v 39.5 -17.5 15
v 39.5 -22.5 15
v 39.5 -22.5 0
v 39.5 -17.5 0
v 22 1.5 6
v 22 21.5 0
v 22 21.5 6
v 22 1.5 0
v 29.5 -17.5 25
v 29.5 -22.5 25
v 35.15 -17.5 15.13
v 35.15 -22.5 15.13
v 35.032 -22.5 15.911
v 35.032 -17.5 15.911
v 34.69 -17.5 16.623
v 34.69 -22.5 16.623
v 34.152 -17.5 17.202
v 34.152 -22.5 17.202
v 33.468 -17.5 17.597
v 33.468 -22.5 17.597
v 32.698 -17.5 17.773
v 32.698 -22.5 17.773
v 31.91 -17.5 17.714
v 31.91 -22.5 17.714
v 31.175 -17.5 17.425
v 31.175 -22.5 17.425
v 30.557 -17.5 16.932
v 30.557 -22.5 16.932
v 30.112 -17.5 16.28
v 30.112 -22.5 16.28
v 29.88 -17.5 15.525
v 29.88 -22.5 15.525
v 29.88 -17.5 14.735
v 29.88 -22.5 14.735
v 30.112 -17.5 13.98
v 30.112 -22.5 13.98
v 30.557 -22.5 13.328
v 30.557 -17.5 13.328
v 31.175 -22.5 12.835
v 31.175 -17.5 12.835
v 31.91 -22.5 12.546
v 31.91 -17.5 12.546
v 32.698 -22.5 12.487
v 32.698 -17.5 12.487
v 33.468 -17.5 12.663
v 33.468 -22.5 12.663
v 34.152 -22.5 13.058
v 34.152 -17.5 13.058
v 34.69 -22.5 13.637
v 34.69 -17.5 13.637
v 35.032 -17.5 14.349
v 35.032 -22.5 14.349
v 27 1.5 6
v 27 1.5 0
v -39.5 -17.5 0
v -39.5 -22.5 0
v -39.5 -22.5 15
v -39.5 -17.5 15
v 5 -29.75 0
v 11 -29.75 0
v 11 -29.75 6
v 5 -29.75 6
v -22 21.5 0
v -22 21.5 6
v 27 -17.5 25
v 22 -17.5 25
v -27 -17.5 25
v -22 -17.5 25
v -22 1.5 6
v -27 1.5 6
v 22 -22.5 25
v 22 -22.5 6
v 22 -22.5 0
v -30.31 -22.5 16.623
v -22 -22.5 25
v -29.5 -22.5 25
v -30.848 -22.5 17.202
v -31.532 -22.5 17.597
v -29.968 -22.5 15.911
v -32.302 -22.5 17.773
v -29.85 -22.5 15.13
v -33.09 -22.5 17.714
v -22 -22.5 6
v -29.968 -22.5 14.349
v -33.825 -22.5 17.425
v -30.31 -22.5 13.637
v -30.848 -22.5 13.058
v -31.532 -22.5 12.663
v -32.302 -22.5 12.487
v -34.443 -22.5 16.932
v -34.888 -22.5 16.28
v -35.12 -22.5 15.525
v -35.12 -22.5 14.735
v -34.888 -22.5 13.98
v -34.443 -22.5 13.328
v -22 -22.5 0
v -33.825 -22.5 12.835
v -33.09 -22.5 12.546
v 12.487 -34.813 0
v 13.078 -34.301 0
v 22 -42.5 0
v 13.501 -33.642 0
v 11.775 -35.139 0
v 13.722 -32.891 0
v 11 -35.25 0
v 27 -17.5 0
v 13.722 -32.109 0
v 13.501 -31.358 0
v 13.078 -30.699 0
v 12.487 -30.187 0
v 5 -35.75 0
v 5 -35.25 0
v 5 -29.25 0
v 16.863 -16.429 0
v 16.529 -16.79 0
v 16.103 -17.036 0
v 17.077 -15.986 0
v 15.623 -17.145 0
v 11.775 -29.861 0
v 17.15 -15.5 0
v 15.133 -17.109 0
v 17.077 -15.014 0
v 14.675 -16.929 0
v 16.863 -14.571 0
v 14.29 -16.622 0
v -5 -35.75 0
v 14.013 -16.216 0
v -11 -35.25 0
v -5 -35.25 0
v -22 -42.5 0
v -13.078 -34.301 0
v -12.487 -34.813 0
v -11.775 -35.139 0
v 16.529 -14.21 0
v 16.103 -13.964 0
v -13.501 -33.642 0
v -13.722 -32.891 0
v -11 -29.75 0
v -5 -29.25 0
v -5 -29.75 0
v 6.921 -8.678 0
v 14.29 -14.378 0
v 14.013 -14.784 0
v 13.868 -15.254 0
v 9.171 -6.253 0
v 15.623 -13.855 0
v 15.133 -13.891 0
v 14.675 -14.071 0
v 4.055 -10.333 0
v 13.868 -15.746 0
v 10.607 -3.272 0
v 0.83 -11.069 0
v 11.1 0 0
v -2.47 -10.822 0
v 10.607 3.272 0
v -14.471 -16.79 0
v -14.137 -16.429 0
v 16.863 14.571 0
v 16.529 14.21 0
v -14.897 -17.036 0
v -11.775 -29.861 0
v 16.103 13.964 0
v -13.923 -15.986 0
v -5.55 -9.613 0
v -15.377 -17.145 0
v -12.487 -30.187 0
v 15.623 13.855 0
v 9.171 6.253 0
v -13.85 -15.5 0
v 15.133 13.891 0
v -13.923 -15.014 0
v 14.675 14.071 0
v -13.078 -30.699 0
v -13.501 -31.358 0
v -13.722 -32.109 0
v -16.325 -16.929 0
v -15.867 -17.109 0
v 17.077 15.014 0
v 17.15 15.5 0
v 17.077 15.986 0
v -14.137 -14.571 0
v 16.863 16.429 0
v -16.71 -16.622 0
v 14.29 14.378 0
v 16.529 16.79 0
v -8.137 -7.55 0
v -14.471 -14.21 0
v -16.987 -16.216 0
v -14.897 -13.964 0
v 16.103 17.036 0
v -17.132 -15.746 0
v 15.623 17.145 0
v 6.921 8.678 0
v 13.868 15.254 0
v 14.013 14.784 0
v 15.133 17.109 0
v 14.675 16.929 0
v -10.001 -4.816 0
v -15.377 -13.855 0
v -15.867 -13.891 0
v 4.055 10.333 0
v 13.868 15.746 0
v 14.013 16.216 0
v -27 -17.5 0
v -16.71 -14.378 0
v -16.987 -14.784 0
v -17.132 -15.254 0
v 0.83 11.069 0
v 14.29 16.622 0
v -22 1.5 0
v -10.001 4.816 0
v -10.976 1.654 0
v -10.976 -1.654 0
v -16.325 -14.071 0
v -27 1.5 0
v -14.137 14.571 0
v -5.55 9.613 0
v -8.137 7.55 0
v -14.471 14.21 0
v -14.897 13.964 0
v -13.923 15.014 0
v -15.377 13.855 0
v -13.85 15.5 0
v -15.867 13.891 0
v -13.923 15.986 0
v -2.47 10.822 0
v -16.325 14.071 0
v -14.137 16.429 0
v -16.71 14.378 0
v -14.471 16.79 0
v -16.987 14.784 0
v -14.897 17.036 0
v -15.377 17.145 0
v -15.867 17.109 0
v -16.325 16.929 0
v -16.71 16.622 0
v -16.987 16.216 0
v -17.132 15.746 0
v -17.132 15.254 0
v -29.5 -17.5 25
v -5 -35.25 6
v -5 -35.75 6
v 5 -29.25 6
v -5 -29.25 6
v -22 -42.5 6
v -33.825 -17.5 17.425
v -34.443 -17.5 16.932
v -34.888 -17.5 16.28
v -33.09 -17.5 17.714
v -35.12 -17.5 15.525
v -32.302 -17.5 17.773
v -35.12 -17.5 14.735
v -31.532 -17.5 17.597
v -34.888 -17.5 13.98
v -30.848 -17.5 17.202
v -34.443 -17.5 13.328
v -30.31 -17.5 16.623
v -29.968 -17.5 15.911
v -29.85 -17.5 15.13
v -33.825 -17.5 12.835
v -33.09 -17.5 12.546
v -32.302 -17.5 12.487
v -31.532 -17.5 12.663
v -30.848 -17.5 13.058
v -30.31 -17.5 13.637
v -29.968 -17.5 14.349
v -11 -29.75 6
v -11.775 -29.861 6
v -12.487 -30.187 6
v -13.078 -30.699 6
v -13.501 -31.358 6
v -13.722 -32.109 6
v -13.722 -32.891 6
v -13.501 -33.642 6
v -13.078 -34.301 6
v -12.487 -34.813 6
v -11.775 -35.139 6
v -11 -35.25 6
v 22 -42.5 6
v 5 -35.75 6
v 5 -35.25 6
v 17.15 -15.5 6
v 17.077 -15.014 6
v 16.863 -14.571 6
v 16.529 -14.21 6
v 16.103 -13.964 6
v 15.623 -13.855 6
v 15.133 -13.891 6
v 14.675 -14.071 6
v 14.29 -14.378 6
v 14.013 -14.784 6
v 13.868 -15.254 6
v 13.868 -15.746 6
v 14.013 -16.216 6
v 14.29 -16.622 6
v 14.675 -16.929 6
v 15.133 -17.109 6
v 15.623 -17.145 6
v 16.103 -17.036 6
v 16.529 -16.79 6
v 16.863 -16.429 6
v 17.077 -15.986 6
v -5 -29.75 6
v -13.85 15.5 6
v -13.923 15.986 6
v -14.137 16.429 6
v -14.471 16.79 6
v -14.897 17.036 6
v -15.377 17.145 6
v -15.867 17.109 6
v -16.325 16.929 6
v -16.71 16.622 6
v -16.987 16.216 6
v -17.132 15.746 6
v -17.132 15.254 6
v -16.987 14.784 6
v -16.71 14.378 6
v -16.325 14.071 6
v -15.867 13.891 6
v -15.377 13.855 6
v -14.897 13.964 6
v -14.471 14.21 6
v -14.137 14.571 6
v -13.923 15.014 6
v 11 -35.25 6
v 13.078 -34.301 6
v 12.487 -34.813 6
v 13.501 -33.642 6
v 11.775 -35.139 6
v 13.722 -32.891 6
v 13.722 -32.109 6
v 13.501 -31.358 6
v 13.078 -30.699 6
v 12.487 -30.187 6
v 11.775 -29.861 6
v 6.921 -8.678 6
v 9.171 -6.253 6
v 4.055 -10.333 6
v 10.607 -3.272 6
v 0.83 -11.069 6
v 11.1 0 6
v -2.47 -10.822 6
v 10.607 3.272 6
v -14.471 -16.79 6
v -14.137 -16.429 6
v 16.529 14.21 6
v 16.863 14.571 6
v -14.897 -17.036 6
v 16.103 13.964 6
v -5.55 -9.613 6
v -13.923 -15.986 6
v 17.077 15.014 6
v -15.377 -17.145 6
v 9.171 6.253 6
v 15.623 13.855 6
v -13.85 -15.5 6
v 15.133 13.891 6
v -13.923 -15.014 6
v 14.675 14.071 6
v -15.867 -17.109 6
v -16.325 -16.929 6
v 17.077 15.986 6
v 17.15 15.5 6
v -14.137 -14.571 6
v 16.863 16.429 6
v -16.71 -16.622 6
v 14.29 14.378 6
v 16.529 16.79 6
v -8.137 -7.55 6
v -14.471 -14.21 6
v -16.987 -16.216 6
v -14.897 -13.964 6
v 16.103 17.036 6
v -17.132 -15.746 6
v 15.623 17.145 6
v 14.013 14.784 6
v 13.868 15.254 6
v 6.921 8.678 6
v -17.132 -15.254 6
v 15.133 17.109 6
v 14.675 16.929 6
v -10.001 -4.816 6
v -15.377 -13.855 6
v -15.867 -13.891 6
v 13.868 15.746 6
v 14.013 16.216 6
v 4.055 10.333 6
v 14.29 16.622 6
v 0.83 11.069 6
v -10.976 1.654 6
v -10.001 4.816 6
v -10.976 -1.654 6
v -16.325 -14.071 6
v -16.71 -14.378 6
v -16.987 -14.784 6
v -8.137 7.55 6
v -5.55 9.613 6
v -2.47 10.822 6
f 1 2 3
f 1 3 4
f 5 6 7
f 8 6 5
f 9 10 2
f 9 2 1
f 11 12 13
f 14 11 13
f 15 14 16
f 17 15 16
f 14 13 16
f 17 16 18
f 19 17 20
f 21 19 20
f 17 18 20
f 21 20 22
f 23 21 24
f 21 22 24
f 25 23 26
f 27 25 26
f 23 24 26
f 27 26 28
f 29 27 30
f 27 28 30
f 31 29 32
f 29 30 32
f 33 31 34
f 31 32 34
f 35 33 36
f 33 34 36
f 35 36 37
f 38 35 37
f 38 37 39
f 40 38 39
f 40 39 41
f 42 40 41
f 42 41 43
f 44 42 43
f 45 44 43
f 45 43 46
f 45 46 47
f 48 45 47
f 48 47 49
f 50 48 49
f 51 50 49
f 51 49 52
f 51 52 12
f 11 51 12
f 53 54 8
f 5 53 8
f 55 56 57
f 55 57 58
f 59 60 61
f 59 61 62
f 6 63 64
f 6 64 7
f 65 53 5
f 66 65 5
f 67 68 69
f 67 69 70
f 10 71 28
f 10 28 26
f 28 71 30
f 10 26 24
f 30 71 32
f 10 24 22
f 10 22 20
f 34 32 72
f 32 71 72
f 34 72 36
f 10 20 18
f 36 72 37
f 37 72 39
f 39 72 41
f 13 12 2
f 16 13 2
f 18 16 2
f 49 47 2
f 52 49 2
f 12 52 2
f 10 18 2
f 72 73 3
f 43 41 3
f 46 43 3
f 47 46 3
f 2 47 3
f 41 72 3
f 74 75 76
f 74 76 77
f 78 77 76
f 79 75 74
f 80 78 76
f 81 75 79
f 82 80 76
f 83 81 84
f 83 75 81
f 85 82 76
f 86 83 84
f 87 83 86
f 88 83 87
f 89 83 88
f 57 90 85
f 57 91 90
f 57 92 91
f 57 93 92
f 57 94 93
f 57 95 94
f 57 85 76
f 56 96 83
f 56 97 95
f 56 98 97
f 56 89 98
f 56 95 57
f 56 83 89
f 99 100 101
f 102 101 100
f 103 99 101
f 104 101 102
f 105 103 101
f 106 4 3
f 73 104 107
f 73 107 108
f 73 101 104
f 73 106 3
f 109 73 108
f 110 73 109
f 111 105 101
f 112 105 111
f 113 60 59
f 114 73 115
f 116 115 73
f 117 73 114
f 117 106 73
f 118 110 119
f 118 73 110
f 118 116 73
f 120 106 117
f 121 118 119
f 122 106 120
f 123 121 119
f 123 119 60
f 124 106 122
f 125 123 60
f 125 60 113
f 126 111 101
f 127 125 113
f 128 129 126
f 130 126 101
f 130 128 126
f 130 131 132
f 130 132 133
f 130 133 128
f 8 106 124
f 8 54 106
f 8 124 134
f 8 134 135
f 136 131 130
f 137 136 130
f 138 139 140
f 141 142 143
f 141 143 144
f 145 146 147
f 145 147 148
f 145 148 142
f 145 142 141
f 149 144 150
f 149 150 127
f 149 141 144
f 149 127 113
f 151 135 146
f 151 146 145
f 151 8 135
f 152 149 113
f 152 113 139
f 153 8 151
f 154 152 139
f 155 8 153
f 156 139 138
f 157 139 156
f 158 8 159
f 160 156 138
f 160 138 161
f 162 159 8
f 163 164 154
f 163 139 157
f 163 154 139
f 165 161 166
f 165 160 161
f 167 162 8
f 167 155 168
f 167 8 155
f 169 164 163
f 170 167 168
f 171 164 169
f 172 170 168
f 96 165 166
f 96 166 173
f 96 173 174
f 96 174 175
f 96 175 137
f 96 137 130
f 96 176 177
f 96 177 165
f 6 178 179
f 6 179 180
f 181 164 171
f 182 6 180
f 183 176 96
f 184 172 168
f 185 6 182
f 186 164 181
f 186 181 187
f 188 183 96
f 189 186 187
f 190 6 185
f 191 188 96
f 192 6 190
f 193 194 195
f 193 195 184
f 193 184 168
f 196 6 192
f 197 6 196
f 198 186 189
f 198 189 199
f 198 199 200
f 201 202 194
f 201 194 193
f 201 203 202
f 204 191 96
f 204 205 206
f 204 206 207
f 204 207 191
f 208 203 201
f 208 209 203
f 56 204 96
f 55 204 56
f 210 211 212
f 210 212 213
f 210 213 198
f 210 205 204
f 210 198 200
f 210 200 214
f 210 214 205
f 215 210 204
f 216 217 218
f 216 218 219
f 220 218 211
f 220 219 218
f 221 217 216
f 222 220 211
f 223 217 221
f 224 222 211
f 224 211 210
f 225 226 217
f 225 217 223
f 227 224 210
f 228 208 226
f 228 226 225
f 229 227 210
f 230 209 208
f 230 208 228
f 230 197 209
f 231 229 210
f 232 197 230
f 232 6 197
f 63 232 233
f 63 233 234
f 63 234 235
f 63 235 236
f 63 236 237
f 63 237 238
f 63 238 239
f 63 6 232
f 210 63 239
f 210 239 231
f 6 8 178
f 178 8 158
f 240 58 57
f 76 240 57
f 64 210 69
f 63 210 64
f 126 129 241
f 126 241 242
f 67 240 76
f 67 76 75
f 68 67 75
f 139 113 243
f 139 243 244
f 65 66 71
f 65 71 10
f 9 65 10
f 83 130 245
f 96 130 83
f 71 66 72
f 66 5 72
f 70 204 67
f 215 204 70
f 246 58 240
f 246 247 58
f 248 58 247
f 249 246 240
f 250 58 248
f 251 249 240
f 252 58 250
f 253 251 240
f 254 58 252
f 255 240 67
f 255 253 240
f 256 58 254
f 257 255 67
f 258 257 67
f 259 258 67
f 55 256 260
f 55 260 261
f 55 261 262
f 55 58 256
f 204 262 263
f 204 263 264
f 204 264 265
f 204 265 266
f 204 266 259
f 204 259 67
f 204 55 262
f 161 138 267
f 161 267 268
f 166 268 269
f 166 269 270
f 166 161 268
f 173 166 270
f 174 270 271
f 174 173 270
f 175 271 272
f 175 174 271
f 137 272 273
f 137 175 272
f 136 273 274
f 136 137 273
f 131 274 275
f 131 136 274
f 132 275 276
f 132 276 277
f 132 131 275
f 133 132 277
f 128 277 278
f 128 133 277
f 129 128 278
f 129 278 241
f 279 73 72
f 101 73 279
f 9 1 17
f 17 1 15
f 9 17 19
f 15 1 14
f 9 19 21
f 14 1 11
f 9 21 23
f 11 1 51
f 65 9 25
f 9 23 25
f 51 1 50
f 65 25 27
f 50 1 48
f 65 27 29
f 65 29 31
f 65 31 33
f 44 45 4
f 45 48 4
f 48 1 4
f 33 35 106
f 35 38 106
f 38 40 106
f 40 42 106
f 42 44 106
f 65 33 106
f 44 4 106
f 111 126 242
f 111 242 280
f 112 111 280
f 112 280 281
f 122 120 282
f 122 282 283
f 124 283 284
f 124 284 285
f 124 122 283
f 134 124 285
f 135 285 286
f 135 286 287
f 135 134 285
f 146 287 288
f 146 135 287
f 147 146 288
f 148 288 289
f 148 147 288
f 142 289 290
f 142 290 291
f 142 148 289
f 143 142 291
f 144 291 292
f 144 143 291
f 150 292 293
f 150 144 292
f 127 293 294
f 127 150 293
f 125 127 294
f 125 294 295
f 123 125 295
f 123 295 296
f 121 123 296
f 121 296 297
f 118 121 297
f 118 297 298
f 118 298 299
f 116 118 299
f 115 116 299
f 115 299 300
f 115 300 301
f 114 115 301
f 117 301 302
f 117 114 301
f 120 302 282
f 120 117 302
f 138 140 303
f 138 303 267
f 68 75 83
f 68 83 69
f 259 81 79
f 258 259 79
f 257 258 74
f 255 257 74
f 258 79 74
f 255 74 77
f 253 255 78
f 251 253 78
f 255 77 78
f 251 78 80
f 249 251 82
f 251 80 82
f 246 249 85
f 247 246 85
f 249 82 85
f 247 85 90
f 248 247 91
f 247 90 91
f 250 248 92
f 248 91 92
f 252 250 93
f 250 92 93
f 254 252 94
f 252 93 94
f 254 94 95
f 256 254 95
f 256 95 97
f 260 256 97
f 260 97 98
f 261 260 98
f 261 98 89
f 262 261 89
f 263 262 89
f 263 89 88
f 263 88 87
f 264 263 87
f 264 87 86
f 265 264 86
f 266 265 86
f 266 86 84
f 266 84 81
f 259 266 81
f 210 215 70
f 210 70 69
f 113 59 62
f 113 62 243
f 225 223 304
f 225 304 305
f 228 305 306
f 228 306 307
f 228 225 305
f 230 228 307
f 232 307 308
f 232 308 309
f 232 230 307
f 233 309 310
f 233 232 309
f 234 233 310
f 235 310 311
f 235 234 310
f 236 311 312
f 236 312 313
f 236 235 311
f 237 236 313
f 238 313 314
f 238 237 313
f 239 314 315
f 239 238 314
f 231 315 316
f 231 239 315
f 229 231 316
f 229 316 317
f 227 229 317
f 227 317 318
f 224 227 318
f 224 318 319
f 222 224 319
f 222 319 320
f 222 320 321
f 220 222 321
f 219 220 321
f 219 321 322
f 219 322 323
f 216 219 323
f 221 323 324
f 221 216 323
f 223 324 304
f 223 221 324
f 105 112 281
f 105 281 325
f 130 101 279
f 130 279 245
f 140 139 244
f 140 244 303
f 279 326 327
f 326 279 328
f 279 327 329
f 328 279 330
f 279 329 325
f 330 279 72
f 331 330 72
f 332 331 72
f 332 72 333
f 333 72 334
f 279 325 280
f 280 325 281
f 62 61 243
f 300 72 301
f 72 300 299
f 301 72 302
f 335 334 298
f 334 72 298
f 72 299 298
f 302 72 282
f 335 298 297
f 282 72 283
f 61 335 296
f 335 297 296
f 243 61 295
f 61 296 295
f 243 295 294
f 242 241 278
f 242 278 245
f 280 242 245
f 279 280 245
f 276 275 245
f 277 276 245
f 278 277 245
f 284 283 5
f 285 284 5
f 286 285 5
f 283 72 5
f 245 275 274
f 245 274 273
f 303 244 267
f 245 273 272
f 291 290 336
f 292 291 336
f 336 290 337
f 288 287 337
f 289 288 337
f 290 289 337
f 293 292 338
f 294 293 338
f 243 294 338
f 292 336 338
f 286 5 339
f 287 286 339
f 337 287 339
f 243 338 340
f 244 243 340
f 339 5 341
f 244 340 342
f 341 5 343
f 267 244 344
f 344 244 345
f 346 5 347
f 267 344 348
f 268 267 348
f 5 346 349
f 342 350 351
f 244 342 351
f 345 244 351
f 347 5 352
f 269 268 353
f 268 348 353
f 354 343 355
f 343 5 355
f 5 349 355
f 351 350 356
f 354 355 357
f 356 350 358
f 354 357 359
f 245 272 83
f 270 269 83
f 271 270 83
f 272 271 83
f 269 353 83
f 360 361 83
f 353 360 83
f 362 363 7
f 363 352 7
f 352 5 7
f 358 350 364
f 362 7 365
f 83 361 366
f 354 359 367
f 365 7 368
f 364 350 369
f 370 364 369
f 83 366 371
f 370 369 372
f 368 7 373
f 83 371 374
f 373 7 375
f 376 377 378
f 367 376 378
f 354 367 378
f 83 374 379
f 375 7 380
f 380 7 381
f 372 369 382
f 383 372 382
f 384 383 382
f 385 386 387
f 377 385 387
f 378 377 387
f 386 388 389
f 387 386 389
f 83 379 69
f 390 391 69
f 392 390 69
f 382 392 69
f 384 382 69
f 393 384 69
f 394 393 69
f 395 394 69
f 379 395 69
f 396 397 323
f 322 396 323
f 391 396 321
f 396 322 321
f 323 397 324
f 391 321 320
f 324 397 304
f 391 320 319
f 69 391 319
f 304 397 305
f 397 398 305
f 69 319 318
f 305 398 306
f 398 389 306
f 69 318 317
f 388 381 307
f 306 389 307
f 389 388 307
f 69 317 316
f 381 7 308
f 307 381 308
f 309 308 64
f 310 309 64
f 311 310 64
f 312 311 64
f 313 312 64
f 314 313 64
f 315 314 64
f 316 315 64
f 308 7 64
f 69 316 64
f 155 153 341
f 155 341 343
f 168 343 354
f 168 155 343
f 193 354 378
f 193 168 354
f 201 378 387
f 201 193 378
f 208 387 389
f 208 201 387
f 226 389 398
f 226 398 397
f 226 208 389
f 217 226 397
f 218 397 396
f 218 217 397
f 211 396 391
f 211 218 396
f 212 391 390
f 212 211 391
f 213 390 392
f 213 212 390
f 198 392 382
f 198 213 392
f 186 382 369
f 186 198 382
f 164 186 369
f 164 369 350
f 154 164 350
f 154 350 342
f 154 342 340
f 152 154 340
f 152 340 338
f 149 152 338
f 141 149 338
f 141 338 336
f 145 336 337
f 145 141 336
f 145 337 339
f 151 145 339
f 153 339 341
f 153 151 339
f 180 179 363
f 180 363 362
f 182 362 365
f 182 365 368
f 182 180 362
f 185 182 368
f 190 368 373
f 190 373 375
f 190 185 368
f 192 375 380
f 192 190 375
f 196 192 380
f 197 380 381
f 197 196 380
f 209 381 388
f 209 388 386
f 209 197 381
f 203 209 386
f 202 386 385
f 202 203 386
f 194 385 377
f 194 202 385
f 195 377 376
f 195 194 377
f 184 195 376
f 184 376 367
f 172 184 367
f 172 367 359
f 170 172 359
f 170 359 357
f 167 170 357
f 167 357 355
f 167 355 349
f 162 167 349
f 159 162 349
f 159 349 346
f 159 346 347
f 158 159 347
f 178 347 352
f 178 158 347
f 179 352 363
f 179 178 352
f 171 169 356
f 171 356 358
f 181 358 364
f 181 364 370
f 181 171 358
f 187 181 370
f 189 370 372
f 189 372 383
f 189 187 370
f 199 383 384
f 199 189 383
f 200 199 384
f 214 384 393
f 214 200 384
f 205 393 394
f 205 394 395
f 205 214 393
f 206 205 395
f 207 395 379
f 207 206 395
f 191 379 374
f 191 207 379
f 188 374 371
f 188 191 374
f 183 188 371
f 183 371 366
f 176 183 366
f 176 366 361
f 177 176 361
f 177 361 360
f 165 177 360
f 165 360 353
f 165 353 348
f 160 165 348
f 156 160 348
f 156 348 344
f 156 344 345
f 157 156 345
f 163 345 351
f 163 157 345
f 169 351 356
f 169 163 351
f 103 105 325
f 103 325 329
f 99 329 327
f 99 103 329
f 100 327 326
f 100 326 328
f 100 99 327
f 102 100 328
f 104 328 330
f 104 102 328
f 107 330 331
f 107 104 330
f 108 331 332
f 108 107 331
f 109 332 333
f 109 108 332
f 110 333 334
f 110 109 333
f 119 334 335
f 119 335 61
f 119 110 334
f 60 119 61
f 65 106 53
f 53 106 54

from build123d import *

# Parameters (mm, degrees)
ESBO_O1_R                = 1.65
ESBO_O1_R_2              = 11.1
RESSALTO_EXTRUS_O1_DEPTH = 6
RESSALTO_EXTRUS_O2_DEPTH = 19
CHANFRO1_SIZE            = 10
CHANFRO2_SIZE            = 19
CORTE_EXTRUS_O1_REACH    = 66.197
ESBO_O3_R                = 2.65


with BuildPart() as part:
    # Esboço1 → Ressalto-extrusão1 (new body)
    with BuildSketch(Plane.XY):
        Polygon((39.50000006, -17.500000656), (39.50000006, -22.500000656), (22.00000006, -22.500000656), (22.00000006, -42.500000656), (-21.99999994, -42.500000656), (-21.99999994, -22.500000656), (-39.49999994, -22.500000656), (-39.49999994, -17.500000656), (-26.99999994, -17.500000656), (-26.99999994, 1.499999344), (-21.99999994, 1.499999344), (-21.99999994, 21.499999344), (22.00000006, 21.499999344), (22.00000006, 1.499999344), (27.00000006, 1.499999344), (27.00000006, -17.500000656), align=None)
        with Locations((15.50000006, 15.499999344)):
            Circle(ESBO_O1_R, mode=Mode.SUBTRACT)
        with Locations((15.50000006, -15.500000656)):
            Circle(ESBO_O1_R, mode=Mode.SUBTRACT)
        with Locations((-15.49999994, 15.499999344)):
            Circle(ESBO_O1_R, mode=Mode.SUBTRACT)
        with Locations((-15.49999994, -15.500000656)):
            Circle(ESBO_O1_R, mode=Mode.SUBTRACT)
        Circle(ESBO_O1_R_2, mode=Mode.SUBTRACT)
        with BuildLine():
            Line((-4.99999994, -35.250000656), (-4.99999994, -35.750000656))
            Line((-4.99999994, -35.750000656), (5.00000006, -35.750000656))
            Line((5.00000006, -35.750000656), (5.00000006, -35.250000656))
            Line((5.00000006, -35.250000656), (11.00000006, -35.250000656))
            ThreePointArc((11.00000006, -35.250000656), (13.75000006, -32.500000656), (11.00000006, -29.750000656))
            Line((11.00000006, -29.750000656), (5.00000006, -29.750000656))
            Line((5.00000006, -29.750000656), (5.00000006, -29.250000656))
            Line((5.00000006, -29.250000656), (-4.99999994, -29.250000656))
            Line((-4.99999994, -29.250000656), (-4.99999994, -29.750000656))
            Line((-4.99999994, -29.750000656), (-10.99999994, -29.750000656))
            ThreePointArc((-10.99999994, -29.750000656), (-13.74999994, -32.500000656), (-10.99999994, -35.250000656))
            Line((-10.99999994, -35.250000656), (-4.99999994, -35.250000656))
        make_face(mode=Mode.SUBTRACT)
    extrude(amount=RESSALTO_EXTRUS_O1_DEPTH)

    # Esboço2 → Ressalto-extrusão2 (add)
    with BuildSketch(Plane.XY.offset(6)):
        Polygon((39.50000006, -22.500000656), (39.50000006, -17.500000656), (27.00000006, -17.500000656), (27.00000006, 1.499999344), (22.00000006, 1.499999344), (22.00000006, -22.500000656), align=None)
        Polygon((-39.49999994, -22.500000656), (-21.99999994, -22.500000656), (-21.99999994, 1.499999344), (-26.99999994, 1.499999344), (-26.99999994, -17.500000656), (-39.49999994, -17.500000656), align=None)
    extrude(amount=RESSALTO_EXTRUS_O2_DEPTH)

    # Chanfro1
    chanfro1_edges = [part.edges().sort_by_distance(p)[0] for p in [
        (39.50000006, -20.000000656, 25),
        (-39.49999994, -20.000000656, 25),
    ]]
    chamfer(chanfro1_edges, length=CHANFRO1_SIZE)

    # Chanfro2
    chanfro2_edges = [part.edges().sort_by_distance(p)[0] for p in [
        (-24.49999994, 1.499999344, 25),
        (24.50000006, 1.499999344, 25),
    ]]
    chamfer(chanfro2_edges, length=CHANFRO2_SIZE)

    # Esboço3 → Corte-extrusão1 (cut, up to next)
    with BuildSketch(Plane.XZ.offset(22.500000656), mode=Mode.PRIVATE) as corte_extrus_o1_sk1:
        with Locations((32.50000006, 15.13)):
            Circle(ESBO_O3_R)
    corte_extrus_o1_tool1 = extrude(corte_extrus_o1_sk1.sketch, amount=-CORTE_EXTRUS_O1_REACH, mode=Mode.PRIVATE) & part.part
    # Esboço3 → Corte-extrusão1 (cut, up to next)
    with BuildSketch(Plane.XZ.offset(22.500000656), mode=Mode.PRIVATE) as corte_extrus_o1_sk2:
        with Locations((-32.49999994, 15.13)):
            Circle(ESBO_O3_R)
    corte_extrus_o1_tool2 = extrude(corte_extrus_o1_sk2.sketch, amount=-CORTE_EXTRUS_O1_REACH, mode=Mode.PRIVATE) & part.part
    add(corte_extrus_o1_tool1.solids().sort_by_distance((32.5, -22.500001, 15.13))[0], mode=Mode.SUBTRACT)
    add(corte_extrus_o1_tool2.solids().sort_by_distance((-32.5, -22.500001, 15.13))[0], mode=Mode.SUBTRACT)


solid = part.part
